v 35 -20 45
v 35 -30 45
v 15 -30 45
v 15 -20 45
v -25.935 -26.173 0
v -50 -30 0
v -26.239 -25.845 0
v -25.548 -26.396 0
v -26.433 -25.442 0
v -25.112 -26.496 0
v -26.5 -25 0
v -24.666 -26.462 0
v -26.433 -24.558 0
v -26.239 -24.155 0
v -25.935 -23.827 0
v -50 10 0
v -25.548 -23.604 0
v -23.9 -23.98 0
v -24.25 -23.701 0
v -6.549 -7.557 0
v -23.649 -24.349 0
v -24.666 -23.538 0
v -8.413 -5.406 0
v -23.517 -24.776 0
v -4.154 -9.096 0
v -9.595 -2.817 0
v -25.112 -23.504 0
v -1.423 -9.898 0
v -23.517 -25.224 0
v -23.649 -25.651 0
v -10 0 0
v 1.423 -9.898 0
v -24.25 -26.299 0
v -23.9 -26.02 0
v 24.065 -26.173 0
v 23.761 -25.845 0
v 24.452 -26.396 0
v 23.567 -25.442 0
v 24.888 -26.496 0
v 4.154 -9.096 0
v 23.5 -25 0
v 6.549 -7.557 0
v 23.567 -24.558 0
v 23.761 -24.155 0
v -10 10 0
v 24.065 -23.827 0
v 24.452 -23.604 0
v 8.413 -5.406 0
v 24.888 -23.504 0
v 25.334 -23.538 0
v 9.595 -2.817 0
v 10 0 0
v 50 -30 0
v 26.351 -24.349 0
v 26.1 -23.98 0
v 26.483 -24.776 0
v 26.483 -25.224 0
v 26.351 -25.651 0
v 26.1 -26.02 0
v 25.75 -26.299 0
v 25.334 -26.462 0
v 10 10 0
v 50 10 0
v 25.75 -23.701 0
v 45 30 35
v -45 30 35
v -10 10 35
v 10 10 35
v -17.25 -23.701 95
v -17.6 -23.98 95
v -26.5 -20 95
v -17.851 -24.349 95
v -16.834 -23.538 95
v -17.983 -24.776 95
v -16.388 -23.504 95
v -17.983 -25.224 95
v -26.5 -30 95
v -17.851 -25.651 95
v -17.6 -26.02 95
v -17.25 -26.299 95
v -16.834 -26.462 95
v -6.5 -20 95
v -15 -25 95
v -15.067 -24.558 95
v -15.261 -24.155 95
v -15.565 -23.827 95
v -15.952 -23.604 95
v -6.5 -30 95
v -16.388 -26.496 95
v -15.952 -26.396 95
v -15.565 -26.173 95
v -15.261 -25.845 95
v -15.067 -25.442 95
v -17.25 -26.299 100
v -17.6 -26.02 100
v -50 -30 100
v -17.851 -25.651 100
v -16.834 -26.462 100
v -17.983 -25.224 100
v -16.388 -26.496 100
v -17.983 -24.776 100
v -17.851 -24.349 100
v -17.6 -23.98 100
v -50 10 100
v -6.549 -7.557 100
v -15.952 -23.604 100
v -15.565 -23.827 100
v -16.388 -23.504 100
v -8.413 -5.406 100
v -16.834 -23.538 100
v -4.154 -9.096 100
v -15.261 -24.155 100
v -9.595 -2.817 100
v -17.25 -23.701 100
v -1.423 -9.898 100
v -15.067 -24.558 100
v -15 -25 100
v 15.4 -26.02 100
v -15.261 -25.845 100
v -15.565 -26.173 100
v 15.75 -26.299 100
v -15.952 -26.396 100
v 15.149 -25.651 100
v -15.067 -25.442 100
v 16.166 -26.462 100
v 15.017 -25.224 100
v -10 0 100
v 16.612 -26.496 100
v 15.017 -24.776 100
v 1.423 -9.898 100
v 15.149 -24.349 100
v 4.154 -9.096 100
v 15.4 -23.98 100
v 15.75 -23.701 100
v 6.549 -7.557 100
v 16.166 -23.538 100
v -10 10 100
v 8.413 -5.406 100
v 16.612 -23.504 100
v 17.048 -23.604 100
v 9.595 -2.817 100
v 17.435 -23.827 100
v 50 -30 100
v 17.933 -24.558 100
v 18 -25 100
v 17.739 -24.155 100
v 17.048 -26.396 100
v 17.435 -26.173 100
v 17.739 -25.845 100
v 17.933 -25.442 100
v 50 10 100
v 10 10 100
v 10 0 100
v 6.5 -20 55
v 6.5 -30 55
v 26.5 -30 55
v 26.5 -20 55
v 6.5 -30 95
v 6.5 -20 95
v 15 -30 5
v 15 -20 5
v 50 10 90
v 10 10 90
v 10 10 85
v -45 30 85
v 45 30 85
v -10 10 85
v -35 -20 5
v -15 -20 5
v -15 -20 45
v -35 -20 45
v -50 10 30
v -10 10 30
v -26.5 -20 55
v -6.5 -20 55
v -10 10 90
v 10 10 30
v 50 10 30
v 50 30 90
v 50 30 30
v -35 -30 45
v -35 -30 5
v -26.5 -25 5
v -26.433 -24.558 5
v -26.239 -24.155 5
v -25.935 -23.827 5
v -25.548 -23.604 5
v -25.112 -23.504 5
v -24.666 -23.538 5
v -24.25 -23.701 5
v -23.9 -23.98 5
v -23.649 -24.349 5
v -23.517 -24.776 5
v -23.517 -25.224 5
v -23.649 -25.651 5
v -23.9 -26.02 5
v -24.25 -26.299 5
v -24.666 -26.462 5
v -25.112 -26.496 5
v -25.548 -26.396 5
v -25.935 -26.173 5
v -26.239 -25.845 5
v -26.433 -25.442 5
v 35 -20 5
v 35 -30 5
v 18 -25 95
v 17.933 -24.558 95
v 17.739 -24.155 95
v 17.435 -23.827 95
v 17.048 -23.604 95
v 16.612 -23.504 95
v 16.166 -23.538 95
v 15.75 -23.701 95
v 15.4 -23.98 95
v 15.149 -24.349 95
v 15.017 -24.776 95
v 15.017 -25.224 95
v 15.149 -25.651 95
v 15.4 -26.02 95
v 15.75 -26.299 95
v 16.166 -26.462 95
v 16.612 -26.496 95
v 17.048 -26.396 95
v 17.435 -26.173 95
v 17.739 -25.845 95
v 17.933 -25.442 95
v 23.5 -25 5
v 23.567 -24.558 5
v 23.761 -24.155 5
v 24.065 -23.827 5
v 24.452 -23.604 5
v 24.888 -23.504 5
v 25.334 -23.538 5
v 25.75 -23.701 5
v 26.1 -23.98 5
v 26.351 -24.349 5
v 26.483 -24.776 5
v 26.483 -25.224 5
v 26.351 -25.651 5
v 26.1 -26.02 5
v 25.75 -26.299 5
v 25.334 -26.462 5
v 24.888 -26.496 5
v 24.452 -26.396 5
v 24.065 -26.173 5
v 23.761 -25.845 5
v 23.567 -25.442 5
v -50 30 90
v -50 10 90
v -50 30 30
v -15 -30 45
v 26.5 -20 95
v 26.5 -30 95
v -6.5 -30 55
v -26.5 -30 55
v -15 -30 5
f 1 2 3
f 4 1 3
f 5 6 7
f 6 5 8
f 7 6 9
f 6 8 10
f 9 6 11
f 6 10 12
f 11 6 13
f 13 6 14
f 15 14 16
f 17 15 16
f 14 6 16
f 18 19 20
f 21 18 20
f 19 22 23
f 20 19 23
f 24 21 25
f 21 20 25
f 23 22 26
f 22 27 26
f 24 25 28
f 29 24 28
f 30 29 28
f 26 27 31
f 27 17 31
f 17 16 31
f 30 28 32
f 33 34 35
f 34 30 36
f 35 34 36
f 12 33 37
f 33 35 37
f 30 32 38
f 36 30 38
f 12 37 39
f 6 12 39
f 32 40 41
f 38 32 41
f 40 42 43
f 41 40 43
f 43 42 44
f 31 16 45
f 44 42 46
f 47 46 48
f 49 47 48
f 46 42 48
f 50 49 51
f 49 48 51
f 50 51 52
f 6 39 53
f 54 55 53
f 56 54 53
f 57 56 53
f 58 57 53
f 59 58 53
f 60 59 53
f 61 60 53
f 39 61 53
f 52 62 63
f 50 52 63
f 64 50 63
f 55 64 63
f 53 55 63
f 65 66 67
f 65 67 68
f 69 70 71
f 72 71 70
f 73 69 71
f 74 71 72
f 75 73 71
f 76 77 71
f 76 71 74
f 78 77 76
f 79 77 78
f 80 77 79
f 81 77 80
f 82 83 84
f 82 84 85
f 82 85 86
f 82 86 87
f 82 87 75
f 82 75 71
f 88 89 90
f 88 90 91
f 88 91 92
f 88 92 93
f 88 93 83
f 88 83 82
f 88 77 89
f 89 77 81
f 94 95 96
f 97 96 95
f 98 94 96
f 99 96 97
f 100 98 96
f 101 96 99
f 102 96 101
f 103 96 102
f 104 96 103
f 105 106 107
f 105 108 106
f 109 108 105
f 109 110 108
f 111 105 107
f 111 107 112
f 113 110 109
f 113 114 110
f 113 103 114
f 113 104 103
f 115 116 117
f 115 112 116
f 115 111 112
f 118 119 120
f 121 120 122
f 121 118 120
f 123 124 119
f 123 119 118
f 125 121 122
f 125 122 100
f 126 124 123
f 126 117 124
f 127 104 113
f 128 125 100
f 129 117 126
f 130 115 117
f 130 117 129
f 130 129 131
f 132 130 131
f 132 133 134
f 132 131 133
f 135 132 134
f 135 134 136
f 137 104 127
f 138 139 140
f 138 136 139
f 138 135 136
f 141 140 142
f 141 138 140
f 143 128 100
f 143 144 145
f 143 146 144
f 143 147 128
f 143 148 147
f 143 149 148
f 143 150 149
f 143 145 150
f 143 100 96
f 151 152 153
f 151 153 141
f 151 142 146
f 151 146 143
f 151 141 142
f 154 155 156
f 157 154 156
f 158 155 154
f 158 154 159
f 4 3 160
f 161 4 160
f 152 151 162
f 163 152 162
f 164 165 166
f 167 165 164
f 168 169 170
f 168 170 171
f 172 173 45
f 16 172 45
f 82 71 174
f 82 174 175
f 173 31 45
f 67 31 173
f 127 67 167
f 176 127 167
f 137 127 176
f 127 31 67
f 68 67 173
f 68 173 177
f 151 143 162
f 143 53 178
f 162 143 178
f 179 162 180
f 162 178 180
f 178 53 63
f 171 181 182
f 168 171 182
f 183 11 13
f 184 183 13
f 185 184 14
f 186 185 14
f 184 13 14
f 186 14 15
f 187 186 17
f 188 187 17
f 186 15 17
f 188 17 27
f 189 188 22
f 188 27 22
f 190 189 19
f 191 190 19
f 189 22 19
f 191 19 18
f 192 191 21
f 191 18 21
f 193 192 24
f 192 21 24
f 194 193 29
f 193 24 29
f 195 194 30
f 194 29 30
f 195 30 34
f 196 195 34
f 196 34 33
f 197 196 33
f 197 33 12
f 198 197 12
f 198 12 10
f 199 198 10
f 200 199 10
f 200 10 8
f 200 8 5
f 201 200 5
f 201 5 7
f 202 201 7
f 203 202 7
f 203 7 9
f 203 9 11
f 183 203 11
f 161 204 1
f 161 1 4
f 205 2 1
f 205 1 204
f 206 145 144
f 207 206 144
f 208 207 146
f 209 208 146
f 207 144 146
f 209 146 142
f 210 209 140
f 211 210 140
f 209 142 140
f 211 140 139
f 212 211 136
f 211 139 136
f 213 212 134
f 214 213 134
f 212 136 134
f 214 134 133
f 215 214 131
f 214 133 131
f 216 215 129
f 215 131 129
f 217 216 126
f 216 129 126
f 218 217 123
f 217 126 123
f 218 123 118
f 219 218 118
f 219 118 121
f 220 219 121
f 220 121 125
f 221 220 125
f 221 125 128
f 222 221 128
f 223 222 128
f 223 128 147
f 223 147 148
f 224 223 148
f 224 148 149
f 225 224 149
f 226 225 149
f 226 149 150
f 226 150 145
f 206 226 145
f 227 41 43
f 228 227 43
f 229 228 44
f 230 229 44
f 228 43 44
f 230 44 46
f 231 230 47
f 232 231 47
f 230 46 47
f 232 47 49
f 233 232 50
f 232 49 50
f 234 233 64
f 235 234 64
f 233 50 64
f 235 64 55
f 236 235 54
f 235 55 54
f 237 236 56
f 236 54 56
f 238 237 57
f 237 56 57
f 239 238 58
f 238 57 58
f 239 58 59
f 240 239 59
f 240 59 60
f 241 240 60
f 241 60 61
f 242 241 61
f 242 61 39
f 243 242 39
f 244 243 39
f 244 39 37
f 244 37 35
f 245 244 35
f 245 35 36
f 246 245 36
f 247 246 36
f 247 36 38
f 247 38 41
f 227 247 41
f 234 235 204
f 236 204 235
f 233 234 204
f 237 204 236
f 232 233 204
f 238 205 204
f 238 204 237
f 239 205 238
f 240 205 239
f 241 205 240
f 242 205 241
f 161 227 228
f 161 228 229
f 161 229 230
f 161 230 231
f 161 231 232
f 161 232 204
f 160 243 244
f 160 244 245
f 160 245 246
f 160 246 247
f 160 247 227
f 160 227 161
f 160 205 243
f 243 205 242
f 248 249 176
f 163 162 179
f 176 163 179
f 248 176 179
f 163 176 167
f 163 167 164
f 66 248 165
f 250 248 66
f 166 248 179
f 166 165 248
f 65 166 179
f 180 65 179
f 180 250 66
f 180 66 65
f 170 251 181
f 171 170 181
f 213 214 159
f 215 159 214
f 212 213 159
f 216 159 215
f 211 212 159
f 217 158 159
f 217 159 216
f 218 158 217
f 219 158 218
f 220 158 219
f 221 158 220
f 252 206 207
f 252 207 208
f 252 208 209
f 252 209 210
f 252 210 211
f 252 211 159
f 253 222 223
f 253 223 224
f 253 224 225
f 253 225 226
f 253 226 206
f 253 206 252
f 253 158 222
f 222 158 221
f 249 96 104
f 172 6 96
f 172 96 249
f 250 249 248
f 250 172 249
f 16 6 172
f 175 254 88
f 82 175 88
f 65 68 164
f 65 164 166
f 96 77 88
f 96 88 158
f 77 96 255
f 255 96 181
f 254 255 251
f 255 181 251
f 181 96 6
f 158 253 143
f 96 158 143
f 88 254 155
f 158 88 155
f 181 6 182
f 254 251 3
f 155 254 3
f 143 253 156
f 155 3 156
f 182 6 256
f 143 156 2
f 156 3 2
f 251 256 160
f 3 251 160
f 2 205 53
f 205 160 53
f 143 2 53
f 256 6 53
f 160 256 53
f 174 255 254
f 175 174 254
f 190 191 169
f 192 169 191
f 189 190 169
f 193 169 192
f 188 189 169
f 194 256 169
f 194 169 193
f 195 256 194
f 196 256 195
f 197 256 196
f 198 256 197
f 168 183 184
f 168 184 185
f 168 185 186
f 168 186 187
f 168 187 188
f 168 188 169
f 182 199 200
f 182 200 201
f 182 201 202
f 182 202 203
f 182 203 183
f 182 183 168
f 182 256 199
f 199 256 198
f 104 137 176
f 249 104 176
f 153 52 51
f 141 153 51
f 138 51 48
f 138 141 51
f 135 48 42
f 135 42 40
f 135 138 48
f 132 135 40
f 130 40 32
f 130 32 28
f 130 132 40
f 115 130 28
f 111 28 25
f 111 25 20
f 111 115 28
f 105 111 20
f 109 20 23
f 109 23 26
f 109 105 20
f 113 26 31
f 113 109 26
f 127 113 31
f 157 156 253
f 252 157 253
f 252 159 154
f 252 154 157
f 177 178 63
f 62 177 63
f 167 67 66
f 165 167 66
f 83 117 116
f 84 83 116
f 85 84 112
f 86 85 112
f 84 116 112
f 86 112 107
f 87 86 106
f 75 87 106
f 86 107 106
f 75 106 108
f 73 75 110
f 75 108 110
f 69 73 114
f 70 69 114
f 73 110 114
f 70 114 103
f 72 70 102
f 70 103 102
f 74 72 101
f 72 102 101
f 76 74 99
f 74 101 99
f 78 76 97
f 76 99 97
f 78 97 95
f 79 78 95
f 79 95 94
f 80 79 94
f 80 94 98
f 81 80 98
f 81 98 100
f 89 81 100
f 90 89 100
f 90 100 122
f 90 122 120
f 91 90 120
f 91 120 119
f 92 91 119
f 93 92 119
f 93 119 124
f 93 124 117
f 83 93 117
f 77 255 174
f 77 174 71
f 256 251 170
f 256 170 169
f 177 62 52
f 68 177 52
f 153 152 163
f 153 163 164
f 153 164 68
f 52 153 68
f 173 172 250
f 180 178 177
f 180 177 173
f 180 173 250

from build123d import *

# Parameters (mm, degrees)
SKETCH4_W           = 100
SKETCH4_H           = 60
BOSS_EXTRUDE2_DEPTH = 100
CUT_EXTRUDE1_DEPTH  = 100
SKETCH7_W           = 30
SKETCH7_H           = 20
CUT_EXTRUDE2_DEPTH  = 100
SKETCH10_W          = 90
SKETCH10_H          = 50
CUT_EXTRUDE6_DEPTH  = 20
BOSS_EXTRUDE3_REACH = 89.321
BOSS_EXTRUDE4_REACH = 89.321
SKETCH13_R          = 1.5
CUT_EXTRUDE7_DEPTH  = 40
SKETCH14_W          = 20
SKETCH14_H          = 40
CUT_EXTRUDE8_DEPTH  = 10
SKETCH15_R          = 1.5
CUT_EXTRUDE9_DEPTH  = 40
SKETCH16_W          = 20
SKETCH16_H          = 40
CUT_EXTRUDE10_DEPTH = 10
SKETCH17_W          = 10
SKETCH17_H          = 20
CUT_EXTRUDE11_DEPTH = 145.568322948


with BuildPart() as part:
    # Sketch4 → Boss-Extrude2 (new body)
    with BuildSketch(Plane.XY):
        Rectangle(SKETCH4_W, SKETCH4_H)
    extrude(amount=BOSS_EXTRUDE2_DEPTH)

    # Sketch6 → Cut-Extrude1 (cut)
    with BuildSketch(Plane.XY.offset(100)):
        with BuildLine():
            Line((-10, 10), (10, 10))
            Line((10, 10), (10, 0))
            ThreePointArc((10, 0), (0, -10), (-10, 0))
            Line((-10, 0), (-10, 10))
        make_face()
    extrude(amount=-CUT_EXTRUDE1_DEPTH, mode=Mode.SUBTRACT)

    # Sketch7 → Cut-Extrude2 (cut)
    with BuildSketch(Plane(origin=(50, 0, 0), x_dir=(0, 0, -1), z_dir=(1, 0, 0))):
        with Locations((-15, 20)):
            Rectangle(SKETCH7_W, SKETCH7_H)
    extrude(amount=-CUT_EXTRUDE2_DEPTH, mode=Mode.SUBTRACT)

    # Sketch10 → Cut-Extrude6 (cut)
    with BuildSketch(Plane(origin=(0, 30, 0), x_dir=(1, 0, 0), z_dir=(0, 1, 0))):
        with Locations((0, -60)):
            Rectangle(SKETCH10_W, SKETCH10_H)
    extrude(amount=-CUT_EXTRUDE6_DEPTH, mode=Mode.SUBTRACT)

    # Sketch11 → Boss-Extrude3 (add, up to next)
    with BuildSketch(Plane.XY.offset(35), mode=Mode.PRIVATE) as boss_extrude3_sk1:
        Polygon((-45, 30), (-45, 10), (-10, 10), align=None)
    boss_extrude3_tool1 = extrude(boss_extrude3_sk1.sketch, amount=BOSS_EXTRUDE3_REACH, mode=Mode.PRIVATE) - part.part
    add(boss_extrude3_tool1.solids().sort_by_distance((-33.333333, 16.666667, 35))[0])

    # Sketch12 → Boss-Extrude4 (add, up to next)
    with BuildSketch(Plane.XY.offset(35), mode=Mode.PRIVATE) as boss_extrude4_sk1:
        Polygon((10, 10), (45, 30), (45, 10), align=None)
    boss_extrude4_tool1 = extrude(boss_extrude4_sk1.sketch, amount=BOSS_EXTRUDE4_REACH, mode=Mode.PRIVATE) - part.part
    add(boss_extrude4_tool1.solids().sort_by_distance((33.333333, 16.666667, 35))[0])

    # Sketch13 → Cut-Extrude7 (cut)
    with BuildSketch(Plane.XY.offset(100)):
        with Locations((-16.5, -25)):
            Circle(SKETCH13_R)
        with Locations((16.5, -25)):
            Circle(SKETCH13_R)
    extrude(amount=-CUT_EXTRUDE7_DEPTH, mode=Mode.SUBTRACT)

    # Sketch14 → Cut-Extrude8 (cut)
    with BuildSketch(Plane.XZ.offset(30)):
        with Locations((-16.5, 75)):
            Rectangle(SKETCH14_W, SKETCH14_H)
        with Locations((16.5, 75)):
            Rectangle(SKETCH14_W, SKETCH14_H)
    extrude(amount=-CUT_EXTRUDE8_DEPTH, mode=Mode.SUBTRACT)

    # Sketch15 → Cut-Extrude9 (cut)
    with BuildSketch(Plane(origin=(0, 0, 0), x_dir=(-1, 0, 0), z_dir=(0, 0, -1))):
        with Locations((-25, -25)):
            Circle(SKETCH15_R)
        with Locations((25, -25)):
            Circle(SKETCH15_R)
    extrude(amount=-CUT_EXTRUDE9_DEPTH, mode=Mode.SUBTRACT)

    # Sketch16 → Cut-Extrude10 (cut)
    with BuildSketch(Plane(origin=(0, -30, 0), x_dir=(-1, 0, 0), z_dir=(0, -1, 0))):
        with Locations((-25, -25)):
            Rectangle(SKETCH16_W, SKETCH16_H)
        with Locations((25, -25)):
            Rectangle(SKETCH16_W, SKETCH16_H)
    extrude(amount=-CUT_EXTRUDE10_DEPTH, mode=Mode.SUBTRACT)

    # Sketch17 → Cut-Extrude11 (cut, through all)
    with BuildSketch(Plane(origin=(50, 0, 0), x_dir=(0, 0, -1), z_dir=(1, 0, 0))):
        with Locations((-95, 20)):
            Rectangle(SKETCH17_W, SKETCH17_H)
    extrude(amount=-CUT_EXTRUDE11_DEPTH, mode=Mode.SUBTRACT)


solid = part.part
